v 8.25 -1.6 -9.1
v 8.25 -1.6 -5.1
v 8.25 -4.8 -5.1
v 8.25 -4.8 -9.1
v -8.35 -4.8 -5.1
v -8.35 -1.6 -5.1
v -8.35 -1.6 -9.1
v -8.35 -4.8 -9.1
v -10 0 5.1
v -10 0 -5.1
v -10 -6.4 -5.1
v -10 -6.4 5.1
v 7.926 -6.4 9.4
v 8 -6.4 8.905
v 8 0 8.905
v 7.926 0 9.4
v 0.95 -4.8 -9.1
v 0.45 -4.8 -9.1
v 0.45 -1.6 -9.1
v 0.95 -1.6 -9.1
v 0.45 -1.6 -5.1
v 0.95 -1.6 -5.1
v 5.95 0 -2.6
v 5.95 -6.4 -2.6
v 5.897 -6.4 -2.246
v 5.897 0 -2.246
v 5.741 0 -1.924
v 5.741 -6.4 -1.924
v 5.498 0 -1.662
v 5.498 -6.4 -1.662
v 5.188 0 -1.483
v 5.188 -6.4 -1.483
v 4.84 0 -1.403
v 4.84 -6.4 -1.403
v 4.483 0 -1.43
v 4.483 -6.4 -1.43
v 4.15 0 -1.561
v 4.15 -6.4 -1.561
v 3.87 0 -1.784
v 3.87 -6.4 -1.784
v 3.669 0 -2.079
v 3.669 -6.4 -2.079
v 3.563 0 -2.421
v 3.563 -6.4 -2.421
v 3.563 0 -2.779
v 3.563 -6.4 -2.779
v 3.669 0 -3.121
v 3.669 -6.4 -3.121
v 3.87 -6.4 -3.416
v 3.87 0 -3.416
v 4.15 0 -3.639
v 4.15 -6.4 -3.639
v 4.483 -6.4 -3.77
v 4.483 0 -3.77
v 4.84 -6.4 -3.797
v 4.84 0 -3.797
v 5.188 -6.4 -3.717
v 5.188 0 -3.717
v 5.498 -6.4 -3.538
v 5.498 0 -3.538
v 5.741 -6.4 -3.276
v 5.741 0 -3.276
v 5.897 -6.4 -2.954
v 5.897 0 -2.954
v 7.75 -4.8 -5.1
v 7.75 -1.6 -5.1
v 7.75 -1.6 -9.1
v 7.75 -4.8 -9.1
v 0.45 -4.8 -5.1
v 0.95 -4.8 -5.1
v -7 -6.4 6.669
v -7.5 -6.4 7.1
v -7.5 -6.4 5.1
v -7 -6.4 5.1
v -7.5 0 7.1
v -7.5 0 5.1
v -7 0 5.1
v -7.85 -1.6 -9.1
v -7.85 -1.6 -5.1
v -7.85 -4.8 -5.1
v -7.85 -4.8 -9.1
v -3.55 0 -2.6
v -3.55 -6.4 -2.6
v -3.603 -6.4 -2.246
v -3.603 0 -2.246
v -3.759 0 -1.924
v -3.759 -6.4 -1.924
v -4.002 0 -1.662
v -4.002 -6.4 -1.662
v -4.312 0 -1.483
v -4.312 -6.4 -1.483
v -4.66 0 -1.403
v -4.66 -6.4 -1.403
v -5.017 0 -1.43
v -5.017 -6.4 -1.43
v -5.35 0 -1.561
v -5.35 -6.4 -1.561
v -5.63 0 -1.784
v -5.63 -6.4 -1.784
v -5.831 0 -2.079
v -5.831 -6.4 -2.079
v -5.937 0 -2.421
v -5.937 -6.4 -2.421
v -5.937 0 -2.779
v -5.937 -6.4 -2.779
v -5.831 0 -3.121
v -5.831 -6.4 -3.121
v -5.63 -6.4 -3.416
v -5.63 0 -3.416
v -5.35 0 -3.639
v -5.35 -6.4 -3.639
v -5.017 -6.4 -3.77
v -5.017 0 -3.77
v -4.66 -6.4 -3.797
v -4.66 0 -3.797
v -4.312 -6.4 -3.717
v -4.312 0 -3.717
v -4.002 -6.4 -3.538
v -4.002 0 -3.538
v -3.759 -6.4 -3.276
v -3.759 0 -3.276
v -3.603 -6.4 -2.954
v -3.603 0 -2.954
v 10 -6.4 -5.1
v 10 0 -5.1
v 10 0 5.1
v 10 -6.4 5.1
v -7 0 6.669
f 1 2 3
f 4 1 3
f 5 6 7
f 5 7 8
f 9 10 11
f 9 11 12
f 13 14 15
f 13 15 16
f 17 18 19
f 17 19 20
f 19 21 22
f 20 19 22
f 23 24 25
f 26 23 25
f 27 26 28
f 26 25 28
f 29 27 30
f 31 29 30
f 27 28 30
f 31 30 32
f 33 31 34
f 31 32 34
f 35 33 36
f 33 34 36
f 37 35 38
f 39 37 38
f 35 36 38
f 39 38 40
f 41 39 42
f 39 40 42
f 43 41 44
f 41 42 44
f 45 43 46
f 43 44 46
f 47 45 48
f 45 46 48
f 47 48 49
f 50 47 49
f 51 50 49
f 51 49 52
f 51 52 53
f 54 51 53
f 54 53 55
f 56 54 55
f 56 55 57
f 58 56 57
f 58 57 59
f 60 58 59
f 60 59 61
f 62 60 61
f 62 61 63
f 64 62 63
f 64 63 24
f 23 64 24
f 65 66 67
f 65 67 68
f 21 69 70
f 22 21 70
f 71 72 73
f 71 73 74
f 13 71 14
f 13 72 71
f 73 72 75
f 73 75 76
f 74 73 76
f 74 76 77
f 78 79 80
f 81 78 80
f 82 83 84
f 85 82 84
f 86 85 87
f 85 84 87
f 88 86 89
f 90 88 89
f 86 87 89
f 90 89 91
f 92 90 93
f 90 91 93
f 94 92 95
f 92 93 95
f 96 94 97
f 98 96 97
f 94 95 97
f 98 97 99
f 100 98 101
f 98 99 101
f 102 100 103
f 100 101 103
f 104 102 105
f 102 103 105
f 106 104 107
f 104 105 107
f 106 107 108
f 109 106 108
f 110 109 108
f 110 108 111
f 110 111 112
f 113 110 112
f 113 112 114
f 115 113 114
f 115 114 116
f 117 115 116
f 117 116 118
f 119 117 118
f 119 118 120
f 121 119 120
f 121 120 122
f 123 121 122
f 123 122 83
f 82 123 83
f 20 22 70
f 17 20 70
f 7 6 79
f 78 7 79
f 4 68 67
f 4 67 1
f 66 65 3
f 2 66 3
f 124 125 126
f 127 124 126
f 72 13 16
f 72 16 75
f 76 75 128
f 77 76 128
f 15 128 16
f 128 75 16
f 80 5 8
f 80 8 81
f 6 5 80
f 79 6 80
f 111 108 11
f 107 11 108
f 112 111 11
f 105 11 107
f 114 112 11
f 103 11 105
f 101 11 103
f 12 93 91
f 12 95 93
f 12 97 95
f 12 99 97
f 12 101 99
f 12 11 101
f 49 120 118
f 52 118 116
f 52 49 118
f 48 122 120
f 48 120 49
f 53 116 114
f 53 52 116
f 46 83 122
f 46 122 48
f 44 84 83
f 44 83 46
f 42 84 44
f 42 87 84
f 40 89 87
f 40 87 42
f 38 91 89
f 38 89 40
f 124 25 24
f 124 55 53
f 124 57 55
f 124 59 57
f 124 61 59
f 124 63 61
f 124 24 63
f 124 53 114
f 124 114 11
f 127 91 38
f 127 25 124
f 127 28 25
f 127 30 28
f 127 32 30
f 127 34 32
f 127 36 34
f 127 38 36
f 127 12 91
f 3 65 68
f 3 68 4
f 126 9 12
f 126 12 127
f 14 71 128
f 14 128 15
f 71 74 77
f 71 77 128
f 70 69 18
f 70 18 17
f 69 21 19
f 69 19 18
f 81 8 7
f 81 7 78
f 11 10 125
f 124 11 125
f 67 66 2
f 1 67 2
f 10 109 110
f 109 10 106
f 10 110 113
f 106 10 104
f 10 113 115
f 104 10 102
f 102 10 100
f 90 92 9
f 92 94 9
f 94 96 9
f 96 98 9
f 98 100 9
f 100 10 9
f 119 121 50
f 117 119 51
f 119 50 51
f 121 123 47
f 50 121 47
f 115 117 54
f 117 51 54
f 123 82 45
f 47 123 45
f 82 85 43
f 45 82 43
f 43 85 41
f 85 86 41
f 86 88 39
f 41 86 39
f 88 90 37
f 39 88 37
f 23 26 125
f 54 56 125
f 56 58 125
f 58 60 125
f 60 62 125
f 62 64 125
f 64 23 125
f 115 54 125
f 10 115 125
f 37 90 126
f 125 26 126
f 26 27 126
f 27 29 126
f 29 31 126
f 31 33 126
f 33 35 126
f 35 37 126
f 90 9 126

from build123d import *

# Parameters (mm, degrees)
F0_W     = 20
F0_H     = 10.2
F1_DEPTH = 6.4
F2_R     = 1.2
F3_DEPTH = 25
F5_DEPTH = 6.4
F6_W     = 0.5
F6_H     = 3.2
F7_DEPTH = 4


with BuildPart() as f1:
    # F0 (on Front) → F1 (new body)
    with BuildSketch(Plane.XZ):
        Rectangle(F0_W, F0_H)
    extrude(amount=F1_DEPTH)

    # F2 (on face) → F3 (cut)
    with BuildSketch(Plane.XZ.offset(6.4)):
        with Locations((-4.75, -2.6)):
            Circle(F2_R)
        with Locations((4.75, -2.6)):
            Circle(F2_R)
    extrude(amount=-F3_DEPTH, mode=Mode.SUBTRACT)


with BuildPart() as f5:
    # F4 (on face) → F5 (new body)
    with BuildSketch(Plane.XZ.offset(6.4)):
        Polygon((7.926267, 9.4), (-7.5, 7.1), (-7.5, 5.1), (-7, 5.1), (-7, 6.669021), (8, 8.905466), align=None)
    extrude(amount=-F5_DEPTH)


with BuildPart() as f7:
    # F6 (on face) → F7 (new body)
    with BuildSketch(Plane(origin=(0, 0, -5.1), x_dir=(1, 0, 0), z_dir=(0, 0, -1))):
        with Locations((-8.1, 3.2)):
            Rectangle(F6_W, F6_H)
        with Locations((0.7, 3.2)):
            Rectangle(F6_W, F6_H)
        with Locations((8, 3.2)):
            Rectangle(F6_W, F6_H)
    extrude(amount=F7_DEPTH)


solid = Compound([f1.part, f5.part, f7.part])
